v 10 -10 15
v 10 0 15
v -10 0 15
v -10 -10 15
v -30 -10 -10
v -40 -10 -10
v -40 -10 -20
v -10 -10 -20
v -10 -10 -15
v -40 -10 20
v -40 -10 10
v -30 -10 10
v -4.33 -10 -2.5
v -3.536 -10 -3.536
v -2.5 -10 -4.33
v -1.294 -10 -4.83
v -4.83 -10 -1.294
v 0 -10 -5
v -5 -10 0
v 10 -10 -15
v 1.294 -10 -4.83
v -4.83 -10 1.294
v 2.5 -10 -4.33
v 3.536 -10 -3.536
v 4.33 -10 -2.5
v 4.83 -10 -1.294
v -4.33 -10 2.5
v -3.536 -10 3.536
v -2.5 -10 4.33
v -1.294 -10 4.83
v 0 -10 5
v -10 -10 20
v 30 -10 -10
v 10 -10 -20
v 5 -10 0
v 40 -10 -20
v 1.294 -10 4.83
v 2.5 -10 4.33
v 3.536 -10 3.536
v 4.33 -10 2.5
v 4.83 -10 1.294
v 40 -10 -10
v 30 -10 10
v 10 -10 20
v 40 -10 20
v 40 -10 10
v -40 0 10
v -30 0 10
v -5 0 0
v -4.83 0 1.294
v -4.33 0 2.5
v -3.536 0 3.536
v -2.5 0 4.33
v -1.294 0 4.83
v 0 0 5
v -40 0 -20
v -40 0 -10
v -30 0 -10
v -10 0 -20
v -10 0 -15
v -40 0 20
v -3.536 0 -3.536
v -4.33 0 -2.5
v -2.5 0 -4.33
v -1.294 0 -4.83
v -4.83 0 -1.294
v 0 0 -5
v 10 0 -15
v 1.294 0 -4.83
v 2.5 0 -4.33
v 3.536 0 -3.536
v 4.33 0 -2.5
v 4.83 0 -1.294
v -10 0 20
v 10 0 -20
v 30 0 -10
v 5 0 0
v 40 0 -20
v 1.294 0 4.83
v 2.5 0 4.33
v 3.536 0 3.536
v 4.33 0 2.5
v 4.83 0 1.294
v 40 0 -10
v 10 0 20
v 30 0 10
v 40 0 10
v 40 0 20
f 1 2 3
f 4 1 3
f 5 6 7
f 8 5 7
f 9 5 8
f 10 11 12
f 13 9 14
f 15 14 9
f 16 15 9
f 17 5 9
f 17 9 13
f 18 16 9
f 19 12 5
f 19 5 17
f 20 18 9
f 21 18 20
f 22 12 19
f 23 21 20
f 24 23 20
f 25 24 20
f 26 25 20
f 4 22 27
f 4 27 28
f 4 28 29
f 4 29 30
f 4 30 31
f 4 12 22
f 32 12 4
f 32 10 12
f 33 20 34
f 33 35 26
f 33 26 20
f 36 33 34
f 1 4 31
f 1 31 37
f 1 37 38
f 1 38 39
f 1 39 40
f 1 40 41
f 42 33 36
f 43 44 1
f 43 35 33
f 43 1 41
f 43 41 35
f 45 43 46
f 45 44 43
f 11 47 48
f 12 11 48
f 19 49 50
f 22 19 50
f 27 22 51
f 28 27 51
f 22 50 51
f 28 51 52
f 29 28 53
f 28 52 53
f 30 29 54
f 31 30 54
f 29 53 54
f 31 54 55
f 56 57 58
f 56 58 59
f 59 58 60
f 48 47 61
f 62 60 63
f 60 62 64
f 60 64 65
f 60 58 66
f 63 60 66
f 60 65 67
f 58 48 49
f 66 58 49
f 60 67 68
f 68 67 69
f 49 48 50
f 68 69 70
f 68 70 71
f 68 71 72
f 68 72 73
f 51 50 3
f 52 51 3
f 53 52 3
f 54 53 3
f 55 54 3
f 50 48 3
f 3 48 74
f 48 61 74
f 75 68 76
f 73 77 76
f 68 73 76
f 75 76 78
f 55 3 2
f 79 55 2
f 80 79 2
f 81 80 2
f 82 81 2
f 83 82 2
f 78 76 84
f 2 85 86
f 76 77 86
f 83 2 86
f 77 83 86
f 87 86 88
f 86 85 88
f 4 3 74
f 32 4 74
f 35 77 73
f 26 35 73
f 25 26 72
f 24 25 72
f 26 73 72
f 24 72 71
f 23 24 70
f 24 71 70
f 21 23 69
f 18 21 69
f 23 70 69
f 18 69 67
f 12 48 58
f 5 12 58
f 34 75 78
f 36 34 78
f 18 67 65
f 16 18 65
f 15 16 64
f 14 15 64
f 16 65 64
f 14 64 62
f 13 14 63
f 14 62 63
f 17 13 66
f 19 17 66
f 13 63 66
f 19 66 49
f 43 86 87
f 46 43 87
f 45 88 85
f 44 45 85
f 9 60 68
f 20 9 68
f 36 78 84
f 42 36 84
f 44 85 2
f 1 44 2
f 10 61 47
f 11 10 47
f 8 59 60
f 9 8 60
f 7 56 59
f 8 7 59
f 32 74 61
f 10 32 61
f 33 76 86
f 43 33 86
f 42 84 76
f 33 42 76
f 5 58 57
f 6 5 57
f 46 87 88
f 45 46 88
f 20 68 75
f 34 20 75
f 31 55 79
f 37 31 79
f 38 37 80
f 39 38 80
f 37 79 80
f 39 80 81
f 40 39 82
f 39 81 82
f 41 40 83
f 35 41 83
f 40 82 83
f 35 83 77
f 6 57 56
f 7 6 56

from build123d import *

# Parameters (mm, degrees)
F1_DEPTH = 10


with BuildPart() as f1:
    # F0 (on Front) → F1 (new body)
    with BuildSketch(Plane.XZ):
        Polygon((30, -10), (30, 0), (30, 10), (40, 10), (40, 20), (10, 20), (10, 15), (0, 15), (-10, 15), (-10, 20), (-40, 20), (-40, 10), (-30, 10), (-30, 0), (-30, -10), (-40, -10), (-40, -20), (-10, -20), (-10, -15), (0, -15), (10, -15), (10, -20), (40, -20), (40, -10), align=None)
        with BuildLine():
            ThreePointArc((0, 5), (3.535534, 3.535534), (5, 0))
            ThreePointArc((5, 0), (3.535534, -3.535534), (0, -5))
            ThreePointArc((0, -5), (-3.535534, -3.535534), (-5, 0))
            ThreePointArc((-5, 0), (-3.535534, 3.535534), (0, 5))
        make_face(mode=Mode.SUBTRACT)
    extrude(amount=F1_DEPTH)


solid = f1.part
